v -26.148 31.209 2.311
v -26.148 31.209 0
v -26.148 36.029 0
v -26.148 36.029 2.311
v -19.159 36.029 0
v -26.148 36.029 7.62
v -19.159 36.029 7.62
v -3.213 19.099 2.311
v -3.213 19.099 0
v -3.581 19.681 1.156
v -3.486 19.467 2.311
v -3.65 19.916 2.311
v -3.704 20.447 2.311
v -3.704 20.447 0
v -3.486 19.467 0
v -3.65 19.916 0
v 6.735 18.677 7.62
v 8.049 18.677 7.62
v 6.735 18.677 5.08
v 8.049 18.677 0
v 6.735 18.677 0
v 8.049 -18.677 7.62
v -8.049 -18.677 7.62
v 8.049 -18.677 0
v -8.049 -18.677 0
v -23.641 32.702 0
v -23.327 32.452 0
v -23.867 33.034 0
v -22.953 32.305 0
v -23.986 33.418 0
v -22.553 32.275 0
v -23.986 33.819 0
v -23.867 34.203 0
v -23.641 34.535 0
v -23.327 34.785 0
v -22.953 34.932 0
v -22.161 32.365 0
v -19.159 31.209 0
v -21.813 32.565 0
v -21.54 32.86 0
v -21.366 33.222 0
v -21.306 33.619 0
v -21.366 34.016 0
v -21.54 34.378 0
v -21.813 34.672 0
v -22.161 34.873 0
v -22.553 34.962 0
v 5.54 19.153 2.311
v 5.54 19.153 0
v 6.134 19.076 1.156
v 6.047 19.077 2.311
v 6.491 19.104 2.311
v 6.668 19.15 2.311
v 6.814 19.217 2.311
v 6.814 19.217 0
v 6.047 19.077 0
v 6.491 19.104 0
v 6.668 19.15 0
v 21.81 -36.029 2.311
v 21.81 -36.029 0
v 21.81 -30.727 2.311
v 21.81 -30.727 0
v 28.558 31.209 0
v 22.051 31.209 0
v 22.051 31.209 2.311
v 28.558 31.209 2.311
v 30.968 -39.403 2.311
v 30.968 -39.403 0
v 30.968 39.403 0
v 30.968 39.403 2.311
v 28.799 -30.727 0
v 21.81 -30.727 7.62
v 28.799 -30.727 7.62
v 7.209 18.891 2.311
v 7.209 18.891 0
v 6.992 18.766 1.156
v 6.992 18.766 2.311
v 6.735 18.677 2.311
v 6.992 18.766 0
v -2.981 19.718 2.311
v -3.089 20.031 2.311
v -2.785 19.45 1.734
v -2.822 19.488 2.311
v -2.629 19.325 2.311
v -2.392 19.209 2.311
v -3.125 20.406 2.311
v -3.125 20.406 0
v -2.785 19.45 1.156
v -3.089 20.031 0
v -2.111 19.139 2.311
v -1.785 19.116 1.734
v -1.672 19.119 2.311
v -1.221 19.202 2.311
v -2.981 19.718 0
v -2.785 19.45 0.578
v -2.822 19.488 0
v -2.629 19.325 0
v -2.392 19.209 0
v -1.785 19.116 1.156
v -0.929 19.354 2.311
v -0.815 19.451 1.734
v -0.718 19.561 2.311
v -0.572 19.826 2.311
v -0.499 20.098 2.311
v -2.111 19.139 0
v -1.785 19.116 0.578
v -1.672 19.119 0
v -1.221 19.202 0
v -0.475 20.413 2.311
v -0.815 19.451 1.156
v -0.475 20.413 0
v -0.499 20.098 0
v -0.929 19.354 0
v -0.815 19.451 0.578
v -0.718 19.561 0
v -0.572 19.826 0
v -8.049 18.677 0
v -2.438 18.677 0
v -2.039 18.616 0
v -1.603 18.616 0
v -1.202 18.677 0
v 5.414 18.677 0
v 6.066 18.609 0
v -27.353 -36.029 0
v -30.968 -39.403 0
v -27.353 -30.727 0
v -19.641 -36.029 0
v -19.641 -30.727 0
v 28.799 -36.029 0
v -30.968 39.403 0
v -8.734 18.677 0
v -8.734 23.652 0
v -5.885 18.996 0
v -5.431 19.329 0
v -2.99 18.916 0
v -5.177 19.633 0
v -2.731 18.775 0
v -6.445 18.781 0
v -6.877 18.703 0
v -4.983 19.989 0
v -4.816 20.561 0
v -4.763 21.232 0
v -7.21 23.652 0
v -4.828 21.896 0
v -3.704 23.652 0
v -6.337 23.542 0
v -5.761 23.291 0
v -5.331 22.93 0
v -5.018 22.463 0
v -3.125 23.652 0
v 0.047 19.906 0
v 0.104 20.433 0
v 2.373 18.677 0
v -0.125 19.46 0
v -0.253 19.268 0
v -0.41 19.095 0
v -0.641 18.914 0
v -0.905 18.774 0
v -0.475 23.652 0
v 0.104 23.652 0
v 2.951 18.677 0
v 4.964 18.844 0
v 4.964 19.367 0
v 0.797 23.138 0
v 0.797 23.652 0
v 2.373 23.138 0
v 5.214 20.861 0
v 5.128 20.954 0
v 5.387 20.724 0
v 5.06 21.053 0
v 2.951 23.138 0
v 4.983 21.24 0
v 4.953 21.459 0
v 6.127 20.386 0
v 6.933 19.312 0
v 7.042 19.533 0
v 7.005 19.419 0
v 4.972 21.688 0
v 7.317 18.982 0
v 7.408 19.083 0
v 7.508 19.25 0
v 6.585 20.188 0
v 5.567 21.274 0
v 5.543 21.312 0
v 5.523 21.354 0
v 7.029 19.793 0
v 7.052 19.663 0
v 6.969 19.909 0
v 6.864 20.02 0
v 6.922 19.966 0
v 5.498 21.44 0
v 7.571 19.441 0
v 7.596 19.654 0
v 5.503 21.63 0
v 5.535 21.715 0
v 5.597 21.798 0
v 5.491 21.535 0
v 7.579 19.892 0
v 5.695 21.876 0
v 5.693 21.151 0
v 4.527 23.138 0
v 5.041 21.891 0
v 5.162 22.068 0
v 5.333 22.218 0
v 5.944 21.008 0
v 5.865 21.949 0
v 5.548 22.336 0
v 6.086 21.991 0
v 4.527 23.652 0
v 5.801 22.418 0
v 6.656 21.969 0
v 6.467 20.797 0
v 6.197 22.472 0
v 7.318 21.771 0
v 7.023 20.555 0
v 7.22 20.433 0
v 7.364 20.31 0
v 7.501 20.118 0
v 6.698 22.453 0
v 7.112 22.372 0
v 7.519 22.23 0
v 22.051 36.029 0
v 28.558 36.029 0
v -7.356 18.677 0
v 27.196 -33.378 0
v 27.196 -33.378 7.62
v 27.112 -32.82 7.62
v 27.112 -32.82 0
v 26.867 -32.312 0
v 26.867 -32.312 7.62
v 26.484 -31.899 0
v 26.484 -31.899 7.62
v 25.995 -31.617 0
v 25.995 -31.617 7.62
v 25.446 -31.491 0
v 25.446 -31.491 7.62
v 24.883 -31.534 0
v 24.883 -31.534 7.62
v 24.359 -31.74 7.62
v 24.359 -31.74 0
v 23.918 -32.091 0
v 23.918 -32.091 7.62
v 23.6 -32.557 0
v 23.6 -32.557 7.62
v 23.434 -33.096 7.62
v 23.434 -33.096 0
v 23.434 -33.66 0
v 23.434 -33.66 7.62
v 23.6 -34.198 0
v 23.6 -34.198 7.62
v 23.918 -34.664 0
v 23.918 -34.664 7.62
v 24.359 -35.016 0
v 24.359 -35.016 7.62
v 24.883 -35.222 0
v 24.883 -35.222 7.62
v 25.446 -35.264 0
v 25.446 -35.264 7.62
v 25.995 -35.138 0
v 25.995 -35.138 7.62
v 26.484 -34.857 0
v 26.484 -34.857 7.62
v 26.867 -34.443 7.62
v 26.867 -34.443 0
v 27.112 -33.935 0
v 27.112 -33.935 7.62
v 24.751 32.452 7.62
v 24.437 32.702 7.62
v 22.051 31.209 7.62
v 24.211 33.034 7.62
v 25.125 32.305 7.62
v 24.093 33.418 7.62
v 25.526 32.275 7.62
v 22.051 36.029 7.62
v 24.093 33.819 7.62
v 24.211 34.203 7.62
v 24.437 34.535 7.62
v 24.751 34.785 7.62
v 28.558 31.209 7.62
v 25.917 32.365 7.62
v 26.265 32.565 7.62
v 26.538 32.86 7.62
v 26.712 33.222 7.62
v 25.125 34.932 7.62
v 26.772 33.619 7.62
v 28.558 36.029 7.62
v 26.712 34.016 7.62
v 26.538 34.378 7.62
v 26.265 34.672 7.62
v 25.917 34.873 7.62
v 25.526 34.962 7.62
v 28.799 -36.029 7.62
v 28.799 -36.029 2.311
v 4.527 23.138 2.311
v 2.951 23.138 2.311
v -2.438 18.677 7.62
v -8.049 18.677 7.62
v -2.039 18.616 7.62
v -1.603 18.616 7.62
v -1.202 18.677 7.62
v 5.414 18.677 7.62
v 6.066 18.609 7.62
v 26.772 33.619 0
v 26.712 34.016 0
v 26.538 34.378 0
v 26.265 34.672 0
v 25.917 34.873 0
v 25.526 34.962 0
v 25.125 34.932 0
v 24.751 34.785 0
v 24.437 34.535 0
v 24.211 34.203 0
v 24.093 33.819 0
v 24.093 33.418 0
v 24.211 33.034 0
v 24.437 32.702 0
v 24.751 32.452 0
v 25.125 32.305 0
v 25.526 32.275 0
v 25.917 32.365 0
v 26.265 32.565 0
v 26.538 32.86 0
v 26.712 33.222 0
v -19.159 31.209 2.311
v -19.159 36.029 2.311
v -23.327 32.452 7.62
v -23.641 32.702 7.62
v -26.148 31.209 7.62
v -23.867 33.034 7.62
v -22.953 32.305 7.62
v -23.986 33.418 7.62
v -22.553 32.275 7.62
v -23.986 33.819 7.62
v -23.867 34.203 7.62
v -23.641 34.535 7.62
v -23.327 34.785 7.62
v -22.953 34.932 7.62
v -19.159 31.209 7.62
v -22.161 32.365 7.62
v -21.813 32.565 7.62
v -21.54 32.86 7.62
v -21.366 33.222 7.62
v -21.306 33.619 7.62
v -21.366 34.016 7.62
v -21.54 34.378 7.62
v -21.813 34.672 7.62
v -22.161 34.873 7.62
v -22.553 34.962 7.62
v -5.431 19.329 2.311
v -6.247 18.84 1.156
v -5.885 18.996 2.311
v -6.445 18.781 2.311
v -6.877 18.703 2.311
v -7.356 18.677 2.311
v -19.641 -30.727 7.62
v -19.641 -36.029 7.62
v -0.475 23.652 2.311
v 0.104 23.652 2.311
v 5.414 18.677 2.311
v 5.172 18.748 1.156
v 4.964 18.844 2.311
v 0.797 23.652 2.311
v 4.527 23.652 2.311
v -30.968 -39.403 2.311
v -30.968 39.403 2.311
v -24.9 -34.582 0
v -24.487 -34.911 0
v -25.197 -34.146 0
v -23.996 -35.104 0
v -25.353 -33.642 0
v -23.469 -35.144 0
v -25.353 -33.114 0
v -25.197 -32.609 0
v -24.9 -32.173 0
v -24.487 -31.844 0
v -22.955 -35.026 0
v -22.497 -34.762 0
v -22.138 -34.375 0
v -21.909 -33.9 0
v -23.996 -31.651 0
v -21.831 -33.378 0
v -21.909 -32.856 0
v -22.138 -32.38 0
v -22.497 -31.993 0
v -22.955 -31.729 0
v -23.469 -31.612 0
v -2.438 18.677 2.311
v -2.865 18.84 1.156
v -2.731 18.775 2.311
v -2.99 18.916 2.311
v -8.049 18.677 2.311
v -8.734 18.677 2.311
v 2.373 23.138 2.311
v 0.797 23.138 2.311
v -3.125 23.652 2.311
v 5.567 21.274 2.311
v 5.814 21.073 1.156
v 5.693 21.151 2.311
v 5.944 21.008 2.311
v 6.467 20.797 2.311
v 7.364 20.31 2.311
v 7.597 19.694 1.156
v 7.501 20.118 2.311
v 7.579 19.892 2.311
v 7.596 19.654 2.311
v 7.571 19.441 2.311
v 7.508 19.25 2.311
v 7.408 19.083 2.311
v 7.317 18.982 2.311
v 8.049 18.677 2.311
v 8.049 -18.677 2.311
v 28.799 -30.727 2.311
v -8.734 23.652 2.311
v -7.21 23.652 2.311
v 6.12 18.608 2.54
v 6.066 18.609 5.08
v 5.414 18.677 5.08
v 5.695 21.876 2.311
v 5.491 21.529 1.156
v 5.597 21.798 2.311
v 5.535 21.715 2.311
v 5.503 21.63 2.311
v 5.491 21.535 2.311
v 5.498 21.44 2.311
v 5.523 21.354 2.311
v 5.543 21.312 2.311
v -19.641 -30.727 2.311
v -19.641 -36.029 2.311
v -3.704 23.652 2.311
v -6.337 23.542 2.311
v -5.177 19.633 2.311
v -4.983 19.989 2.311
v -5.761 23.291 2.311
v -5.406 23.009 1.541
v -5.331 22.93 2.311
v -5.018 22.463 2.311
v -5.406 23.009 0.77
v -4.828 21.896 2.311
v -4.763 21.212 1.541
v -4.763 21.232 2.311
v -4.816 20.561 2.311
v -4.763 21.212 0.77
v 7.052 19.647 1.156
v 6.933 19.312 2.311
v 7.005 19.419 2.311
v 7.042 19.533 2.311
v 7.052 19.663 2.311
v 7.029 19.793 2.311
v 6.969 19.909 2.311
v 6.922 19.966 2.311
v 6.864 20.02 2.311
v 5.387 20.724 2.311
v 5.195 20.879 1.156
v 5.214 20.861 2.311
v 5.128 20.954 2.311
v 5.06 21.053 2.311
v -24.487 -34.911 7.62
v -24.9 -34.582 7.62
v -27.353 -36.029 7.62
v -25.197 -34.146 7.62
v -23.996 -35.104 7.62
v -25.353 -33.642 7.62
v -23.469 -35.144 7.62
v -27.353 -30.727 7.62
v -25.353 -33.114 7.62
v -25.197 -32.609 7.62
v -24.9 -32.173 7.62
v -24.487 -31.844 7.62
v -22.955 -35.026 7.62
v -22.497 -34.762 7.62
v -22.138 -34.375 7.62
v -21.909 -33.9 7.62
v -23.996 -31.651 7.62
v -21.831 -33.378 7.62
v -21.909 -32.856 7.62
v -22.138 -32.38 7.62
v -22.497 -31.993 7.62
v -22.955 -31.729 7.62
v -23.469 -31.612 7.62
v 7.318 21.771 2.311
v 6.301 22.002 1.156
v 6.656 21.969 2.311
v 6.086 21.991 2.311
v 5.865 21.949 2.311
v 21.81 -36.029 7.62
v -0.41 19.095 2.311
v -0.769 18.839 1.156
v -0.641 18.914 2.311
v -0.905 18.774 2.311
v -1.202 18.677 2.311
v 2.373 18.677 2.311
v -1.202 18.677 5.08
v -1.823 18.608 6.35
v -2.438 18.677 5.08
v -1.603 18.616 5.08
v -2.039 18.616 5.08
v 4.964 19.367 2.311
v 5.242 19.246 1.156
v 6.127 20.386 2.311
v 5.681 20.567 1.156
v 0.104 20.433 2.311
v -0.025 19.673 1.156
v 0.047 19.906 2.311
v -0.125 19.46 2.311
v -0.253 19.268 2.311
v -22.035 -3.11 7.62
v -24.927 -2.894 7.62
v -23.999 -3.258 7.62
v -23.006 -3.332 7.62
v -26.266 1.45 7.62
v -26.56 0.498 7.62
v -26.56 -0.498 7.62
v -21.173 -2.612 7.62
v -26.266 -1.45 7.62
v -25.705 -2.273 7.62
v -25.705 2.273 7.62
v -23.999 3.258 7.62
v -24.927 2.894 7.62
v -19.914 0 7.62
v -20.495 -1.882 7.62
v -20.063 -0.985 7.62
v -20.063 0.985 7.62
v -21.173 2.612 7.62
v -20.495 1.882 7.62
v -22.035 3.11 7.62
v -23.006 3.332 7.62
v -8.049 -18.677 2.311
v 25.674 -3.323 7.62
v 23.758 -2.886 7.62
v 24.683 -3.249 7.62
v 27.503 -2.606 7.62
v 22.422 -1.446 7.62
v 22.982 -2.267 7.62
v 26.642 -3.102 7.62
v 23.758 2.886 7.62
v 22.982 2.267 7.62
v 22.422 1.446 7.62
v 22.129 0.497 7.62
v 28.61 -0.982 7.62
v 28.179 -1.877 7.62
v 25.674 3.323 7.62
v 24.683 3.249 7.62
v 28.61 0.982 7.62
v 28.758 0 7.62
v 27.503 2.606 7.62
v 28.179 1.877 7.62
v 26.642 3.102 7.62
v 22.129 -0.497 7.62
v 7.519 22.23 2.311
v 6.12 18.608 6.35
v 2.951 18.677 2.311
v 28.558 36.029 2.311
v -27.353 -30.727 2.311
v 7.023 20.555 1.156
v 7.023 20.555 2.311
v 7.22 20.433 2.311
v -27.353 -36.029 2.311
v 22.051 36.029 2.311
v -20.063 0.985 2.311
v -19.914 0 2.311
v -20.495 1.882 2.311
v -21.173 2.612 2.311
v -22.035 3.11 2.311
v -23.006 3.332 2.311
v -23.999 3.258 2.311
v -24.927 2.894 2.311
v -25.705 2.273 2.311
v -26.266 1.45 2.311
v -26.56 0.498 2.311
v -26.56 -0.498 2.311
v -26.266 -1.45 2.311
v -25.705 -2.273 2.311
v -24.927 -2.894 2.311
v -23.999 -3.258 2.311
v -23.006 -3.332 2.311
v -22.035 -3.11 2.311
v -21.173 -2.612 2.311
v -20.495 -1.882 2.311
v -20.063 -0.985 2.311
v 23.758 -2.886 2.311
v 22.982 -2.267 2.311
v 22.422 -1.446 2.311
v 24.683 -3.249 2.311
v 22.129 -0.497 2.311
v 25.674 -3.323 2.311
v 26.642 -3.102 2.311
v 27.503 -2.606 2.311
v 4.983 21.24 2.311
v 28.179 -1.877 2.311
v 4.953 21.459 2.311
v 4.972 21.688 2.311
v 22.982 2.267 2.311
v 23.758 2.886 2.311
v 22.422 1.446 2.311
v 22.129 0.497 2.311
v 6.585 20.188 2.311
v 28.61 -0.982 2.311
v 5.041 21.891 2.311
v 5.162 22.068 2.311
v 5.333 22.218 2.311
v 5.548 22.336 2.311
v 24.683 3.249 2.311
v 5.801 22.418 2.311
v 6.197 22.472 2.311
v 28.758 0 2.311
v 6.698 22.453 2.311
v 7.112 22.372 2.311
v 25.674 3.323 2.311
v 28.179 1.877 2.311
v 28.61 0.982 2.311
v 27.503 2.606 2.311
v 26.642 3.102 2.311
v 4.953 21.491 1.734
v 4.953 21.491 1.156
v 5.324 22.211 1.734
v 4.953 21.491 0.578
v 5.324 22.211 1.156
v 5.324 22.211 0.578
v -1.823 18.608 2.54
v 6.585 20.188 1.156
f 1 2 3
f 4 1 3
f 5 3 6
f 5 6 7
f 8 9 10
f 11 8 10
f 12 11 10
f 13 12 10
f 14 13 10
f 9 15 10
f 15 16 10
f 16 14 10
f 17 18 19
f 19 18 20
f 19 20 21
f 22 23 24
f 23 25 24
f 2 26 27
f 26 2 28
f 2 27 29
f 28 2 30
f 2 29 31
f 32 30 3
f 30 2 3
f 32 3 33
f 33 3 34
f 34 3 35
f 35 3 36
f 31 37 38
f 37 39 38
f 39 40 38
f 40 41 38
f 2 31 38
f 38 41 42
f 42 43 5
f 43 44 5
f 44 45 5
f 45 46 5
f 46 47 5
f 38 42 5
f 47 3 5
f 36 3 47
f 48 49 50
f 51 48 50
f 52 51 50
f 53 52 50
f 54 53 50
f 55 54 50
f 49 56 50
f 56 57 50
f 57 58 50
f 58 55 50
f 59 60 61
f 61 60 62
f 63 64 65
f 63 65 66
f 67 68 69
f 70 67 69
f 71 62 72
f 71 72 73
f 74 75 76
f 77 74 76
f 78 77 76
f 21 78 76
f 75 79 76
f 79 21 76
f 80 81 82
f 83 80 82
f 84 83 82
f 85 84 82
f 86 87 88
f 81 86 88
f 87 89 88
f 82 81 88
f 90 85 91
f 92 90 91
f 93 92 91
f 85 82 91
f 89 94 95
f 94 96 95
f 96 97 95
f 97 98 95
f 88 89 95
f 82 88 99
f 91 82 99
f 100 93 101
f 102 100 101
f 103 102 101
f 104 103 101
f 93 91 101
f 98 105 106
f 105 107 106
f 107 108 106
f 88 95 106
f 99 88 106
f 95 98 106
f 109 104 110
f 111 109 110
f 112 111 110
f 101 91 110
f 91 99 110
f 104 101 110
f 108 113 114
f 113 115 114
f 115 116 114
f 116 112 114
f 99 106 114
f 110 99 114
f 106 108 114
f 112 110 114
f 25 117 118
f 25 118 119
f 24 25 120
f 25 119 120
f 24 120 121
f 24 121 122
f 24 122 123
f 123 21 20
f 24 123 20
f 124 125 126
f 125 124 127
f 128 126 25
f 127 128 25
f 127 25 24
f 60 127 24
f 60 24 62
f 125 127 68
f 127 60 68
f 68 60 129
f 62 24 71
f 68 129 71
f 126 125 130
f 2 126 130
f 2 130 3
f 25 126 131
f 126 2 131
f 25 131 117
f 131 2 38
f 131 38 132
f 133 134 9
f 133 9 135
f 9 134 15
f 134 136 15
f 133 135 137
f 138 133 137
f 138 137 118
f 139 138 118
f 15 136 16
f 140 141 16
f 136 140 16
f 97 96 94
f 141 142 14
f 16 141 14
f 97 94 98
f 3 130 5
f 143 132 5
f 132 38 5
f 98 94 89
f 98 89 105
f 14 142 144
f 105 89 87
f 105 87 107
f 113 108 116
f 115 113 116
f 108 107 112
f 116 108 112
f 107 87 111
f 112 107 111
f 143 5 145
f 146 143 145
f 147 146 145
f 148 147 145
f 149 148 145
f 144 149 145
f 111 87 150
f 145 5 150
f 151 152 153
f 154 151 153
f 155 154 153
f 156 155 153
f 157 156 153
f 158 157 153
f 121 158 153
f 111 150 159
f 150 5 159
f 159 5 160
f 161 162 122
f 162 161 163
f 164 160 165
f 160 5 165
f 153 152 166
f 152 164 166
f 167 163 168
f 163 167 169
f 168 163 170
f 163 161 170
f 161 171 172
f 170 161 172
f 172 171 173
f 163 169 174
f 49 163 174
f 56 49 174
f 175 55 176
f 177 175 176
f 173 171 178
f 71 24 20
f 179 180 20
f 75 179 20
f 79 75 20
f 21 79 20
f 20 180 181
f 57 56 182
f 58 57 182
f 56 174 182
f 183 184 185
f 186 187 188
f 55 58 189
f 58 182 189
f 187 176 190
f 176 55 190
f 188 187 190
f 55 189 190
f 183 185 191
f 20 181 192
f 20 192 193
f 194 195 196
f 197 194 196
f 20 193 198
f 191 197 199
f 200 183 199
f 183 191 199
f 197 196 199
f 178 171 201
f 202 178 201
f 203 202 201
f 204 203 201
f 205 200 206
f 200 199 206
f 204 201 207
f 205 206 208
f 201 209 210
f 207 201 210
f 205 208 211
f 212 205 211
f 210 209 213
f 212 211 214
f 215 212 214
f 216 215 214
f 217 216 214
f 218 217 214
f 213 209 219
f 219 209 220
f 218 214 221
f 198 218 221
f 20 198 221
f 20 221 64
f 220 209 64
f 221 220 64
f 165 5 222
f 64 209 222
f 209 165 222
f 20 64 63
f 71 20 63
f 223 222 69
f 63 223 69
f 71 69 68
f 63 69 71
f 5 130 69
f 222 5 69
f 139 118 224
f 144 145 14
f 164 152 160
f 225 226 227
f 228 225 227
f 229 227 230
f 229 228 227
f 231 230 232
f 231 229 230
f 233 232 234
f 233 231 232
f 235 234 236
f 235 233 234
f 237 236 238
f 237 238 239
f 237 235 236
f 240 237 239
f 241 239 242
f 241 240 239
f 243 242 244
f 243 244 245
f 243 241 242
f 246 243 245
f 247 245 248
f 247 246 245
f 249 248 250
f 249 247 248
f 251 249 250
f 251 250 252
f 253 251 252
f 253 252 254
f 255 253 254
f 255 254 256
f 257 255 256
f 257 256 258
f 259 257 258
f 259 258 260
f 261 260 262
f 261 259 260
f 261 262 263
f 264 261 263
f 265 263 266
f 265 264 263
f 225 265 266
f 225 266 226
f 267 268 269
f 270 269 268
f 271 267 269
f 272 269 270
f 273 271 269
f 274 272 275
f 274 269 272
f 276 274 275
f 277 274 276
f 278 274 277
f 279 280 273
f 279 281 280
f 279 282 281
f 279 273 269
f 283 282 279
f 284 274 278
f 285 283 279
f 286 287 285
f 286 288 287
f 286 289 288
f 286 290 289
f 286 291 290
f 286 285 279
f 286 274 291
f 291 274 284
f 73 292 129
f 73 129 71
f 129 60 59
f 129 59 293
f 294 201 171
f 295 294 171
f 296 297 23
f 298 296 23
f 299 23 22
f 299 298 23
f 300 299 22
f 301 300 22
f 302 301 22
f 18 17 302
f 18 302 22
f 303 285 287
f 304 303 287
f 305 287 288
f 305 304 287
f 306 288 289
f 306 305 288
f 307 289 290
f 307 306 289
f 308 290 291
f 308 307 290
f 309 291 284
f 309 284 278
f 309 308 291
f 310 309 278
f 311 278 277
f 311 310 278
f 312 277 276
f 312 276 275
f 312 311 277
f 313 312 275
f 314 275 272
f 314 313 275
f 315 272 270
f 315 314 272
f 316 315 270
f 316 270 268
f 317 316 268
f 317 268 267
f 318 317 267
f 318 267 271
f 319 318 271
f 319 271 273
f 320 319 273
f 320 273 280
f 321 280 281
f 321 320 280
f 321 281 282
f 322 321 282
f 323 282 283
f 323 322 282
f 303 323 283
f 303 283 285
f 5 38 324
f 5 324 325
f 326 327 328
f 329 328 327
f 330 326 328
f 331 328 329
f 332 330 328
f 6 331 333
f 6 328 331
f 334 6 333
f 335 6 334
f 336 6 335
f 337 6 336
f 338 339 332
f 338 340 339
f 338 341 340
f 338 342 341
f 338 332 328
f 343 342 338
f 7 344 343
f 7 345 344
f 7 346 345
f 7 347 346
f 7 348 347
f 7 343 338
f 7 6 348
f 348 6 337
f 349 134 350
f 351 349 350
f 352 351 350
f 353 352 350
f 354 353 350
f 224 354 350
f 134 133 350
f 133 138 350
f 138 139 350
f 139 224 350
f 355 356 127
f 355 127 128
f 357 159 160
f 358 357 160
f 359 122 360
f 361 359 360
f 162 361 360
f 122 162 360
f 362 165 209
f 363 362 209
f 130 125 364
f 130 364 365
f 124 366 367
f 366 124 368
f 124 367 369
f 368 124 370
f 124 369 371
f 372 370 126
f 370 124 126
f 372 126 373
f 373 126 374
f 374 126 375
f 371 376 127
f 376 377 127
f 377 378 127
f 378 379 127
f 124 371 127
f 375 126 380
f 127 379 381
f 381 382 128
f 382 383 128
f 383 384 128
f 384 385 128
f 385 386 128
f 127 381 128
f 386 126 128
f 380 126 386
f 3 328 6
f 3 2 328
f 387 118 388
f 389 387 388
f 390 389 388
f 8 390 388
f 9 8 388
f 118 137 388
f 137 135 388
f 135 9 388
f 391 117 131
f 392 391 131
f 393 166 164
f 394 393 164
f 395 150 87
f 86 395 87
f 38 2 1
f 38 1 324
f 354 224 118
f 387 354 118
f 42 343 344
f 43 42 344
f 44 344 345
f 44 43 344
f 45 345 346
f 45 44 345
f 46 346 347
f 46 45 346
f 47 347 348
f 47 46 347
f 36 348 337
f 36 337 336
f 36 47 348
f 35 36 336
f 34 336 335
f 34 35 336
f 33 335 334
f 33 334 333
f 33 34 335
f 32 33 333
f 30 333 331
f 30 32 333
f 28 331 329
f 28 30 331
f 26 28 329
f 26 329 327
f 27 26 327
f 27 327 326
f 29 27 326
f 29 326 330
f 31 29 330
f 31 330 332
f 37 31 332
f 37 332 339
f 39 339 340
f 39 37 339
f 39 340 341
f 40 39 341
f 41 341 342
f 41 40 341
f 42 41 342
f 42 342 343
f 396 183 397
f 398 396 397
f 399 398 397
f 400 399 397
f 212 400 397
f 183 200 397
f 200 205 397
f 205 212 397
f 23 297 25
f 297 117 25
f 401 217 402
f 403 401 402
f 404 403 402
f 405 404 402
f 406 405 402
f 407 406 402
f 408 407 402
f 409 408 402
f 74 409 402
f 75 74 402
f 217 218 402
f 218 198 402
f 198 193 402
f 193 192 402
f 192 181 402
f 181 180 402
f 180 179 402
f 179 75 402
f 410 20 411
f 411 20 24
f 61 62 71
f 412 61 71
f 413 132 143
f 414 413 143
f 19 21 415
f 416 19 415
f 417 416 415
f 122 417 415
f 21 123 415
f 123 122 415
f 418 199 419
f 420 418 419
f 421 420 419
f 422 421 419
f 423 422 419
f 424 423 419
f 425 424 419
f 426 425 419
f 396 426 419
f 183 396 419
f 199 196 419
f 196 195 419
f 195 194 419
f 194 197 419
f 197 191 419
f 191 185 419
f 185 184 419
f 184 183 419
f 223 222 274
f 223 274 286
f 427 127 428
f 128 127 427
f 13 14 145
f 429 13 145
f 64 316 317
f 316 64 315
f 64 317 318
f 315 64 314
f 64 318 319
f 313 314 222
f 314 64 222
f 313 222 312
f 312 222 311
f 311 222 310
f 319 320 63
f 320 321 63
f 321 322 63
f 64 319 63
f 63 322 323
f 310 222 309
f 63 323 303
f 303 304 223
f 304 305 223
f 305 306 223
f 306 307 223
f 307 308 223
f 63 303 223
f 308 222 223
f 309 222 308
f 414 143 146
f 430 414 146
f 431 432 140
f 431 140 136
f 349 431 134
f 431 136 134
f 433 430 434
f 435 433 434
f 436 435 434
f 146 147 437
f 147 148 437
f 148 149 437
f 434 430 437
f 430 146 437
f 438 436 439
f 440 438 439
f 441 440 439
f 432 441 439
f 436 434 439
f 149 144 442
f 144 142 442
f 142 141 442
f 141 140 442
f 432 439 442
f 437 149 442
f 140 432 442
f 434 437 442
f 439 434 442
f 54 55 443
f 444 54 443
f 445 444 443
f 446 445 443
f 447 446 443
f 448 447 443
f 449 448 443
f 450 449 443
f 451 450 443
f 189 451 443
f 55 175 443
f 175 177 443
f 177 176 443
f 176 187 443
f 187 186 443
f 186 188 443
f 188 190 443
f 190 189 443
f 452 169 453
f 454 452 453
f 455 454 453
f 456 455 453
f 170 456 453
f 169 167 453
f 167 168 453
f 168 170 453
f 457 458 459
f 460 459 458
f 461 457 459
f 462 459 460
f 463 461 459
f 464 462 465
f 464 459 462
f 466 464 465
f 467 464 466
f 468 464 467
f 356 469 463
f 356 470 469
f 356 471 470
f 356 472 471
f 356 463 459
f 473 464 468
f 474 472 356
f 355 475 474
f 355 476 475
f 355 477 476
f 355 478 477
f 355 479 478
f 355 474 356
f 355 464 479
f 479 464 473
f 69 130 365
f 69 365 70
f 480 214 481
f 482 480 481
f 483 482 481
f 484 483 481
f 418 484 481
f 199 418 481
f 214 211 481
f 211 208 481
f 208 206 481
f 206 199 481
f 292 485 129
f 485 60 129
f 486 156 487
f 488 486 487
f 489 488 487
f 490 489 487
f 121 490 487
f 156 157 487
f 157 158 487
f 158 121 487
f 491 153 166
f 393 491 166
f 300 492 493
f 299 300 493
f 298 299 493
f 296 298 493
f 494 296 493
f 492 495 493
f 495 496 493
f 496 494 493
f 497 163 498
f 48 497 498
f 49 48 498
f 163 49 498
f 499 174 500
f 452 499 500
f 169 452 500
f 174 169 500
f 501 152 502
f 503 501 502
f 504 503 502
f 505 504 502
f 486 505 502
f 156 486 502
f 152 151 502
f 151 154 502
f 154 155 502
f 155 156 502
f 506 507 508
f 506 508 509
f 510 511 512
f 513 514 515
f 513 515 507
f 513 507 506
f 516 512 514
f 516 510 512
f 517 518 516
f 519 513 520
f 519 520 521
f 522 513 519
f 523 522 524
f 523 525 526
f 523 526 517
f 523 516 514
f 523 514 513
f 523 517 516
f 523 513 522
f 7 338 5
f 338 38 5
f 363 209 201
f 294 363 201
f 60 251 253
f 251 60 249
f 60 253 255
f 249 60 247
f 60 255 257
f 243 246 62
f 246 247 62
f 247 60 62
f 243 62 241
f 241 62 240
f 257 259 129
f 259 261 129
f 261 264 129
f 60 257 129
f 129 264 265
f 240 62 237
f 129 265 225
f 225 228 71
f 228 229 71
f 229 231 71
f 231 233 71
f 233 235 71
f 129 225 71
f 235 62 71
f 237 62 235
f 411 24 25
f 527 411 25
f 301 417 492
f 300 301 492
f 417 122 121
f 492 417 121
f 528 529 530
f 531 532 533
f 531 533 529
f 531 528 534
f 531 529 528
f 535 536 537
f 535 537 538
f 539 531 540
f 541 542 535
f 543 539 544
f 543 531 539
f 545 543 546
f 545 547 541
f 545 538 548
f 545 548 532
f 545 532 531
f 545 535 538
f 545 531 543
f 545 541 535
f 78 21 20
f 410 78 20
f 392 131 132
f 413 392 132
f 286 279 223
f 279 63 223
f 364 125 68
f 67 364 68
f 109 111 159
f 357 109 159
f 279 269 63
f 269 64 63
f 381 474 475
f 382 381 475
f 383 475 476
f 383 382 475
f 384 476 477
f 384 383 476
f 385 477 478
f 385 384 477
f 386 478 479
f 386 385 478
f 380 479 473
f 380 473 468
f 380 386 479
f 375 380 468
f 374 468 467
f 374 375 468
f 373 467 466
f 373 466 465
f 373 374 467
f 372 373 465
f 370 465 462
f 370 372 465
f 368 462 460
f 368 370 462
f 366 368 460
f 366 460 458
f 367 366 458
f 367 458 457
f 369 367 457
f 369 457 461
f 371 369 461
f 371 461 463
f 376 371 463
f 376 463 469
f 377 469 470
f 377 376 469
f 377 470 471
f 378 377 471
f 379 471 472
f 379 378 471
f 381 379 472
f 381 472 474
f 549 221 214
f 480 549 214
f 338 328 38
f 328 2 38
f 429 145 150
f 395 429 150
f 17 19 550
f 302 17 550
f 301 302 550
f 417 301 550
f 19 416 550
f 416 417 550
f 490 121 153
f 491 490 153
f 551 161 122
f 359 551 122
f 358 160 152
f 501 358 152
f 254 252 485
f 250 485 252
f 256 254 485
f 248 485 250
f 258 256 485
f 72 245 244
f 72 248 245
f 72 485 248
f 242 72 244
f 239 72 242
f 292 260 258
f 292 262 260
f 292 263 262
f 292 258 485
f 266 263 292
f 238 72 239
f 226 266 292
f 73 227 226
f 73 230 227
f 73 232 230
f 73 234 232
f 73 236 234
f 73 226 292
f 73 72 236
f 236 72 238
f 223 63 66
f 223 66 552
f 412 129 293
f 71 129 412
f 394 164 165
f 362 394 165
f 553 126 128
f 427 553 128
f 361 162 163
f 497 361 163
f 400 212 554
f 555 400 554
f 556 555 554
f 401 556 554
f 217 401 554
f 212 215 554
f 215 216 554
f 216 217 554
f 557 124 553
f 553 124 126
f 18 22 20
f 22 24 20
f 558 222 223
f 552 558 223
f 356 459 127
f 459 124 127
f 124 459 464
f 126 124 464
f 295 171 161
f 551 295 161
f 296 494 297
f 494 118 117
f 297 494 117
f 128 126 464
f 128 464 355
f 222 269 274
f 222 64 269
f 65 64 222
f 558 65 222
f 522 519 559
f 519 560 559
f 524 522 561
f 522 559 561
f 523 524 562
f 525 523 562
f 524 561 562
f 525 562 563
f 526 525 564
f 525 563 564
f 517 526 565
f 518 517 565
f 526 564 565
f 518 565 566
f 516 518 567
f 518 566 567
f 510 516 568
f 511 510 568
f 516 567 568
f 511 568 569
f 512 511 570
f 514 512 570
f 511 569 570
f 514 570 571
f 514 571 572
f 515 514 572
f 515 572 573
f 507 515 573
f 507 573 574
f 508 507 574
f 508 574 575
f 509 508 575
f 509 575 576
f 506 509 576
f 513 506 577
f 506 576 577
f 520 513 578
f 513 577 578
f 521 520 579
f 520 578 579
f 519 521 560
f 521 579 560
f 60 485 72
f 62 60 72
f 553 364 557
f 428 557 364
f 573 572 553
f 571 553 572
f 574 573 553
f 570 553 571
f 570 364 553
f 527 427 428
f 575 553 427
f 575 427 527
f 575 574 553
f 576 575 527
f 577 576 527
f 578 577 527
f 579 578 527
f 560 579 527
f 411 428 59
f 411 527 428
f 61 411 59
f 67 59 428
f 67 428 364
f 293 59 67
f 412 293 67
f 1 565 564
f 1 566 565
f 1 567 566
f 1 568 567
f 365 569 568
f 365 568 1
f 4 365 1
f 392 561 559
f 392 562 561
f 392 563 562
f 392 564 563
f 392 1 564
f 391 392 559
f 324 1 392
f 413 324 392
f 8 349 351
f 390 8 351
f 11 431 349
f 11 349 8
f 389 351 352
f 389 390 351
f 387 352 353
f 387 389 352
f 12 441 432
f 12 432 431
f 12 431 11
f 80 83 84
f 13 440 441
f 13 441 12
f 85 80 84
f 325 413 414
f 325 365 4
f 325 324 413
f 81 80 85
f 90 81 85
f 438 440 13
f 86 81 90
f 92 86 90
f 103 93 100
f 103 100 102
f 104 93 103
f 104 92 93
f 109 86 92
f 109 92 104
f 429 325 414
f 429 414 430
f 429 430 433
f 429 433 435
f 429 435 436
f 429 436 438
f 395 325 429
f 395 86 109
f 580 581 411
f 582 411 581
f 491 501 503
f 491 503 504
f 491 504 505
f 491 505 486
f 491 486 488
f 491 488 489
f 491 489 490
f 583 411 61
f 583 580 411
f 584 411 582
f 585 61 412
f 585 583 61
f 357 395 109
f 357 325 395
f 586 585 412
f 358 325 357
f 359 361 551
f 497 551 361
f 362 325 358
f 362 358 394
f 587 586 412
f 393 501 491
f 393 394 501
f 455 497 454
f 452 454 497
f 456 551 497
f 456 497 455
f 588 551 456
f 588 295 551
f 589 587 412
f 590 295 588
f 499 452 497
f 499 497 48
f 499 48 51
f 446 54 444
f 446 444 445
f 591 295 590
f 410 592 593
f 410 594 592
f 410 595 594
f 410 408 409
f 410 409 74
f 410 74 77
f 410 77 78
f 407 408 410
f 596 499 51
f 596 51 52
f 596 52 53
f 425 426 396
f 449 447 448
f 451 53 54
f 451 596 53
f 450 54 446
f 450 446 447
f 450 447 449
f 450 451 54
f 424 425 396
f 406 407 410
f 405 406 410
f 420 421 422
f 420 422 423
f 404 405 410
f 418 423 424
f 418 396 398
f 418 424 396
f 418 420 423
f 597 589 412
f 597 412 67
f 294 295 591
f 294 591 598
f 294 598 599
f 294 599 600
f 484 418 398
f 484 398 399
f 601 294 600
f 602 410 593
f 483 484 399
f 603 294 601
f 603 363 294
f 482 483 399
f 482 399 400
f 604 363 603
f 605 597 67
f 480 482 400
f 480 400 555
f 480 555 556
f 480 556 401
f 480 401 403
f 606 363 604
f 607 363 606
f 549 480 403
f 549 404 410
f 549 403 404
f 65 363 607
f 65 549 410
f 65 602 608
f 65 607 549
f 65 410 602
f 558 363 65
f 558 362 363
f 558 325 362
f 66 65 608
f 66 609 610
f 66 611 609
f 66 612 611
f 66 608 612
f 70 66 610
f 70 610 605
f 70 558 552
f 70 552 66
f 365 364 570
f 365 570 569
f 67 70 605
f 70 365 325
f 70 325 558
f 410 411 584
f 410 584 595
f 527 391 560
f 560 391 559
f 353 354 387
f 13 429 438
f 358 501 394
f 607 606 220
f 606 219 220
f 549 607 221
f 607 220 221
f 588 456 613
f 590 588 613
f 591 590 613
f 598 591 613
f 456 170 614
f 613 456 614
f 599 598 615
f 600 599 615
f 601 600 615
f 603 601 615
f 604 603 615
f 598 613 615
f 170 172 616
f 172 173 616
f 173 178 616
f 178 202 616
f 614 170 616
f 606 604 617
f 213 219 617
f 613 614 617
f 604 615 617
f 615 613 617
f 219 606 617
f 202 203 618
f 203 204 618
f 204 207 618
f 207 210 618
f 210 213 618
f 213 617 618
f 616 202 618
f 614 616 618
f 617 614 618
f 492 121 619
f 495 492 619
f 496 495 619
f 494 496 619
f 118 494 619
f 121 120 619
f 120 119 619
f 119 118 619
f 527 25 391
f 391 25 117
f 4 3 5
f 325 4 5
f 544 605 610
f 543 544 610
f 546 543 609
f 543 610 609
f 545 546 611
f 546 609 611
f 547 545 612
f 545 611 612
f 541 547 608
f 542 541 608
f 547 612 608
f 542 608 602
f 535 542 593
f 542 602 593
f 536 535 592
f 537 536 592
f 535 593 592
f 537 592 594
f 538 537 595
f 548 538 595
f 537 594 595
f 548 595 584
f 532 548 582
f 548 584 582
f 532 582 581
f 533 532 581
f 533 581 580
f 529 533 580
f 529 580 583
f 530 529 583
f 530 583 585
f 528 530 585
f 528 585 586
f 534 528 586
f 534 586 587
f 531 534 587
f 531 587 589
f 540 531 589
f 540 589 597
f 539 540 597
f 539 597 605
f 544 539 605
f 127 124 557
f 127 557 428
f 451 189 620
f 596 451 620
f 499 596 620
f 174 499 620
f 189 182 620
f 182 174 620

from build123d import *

# Parameters (mm, degrees)
F0_W     = 7.7118072659
F0_H     = 5.301868543
F0_R     = 1.7710457529
F1_DEPTH = 5.08
F2_DEPTH = 5.08
F0_W_2   = 6.9888234138
F0_H_2   = 4.819881171
F0_R_2   = 1.3471992838
F0_W_3   = 6.5068379045
F0_R_3   = 1.3471999502
F0_W_4   = 6.9888252765
F0_R_4   = 1.8915130698
F0_W_5   = 61.9354508817
F0_H_3   = 78.8050293922
F0_R_5   = 3.3414839528
F0_R_6   = 3.3327824733
F3_DEPTH = 2.3114
F4_DEPTH = 5.08
F5_DEPTH = 5.08
F6_DEPTH = 2.54
F7_DEPTH = 2.54


with BuildPart() as f1:
    # F0 (on Top) → F1 (new body)
    with BuildSketch(Plane.XY):
        with Locations((-23.4969137236, -33.3776669577)):
            Rectangle(F0_W, F0_H)
        with Locations((-23.6016474664, -33.3776669577)):
            Circle(F0_R, mode=Mode.SUBTRACT)
    extrude(amount=F1_DEPTH)

    # F6 (add): a face of the model
    f6_faces = [f1.faces().sort_by_distance(p)[0] for p in [
        (-27.2592322182, -33.3776669577, 5.08),
    ]]
    extrude(f6_faces, amount=F6_DEPTH)


with BuildPart() as f2:
    # F0 (on Top) → F2 (new body)
    with BuildSketch(Plane.XY):
        with BuildLine():
            Line((5.4143961645, 18.6770316213), (2.9512789585, 18.6770316213))
            Line((2.9512789585, 18.6770316213), (2.3730507167, 18.6770316213))
            Line((2.3730507167, 18.6770316213), (-1.2022836336, 18.6770316213))
            add(Edge.make_bspline(
                [(-1.2022836336, 18.6770316213), (-1.4853750183, 18.6084282706), (-1.8226430983, 18.6084282706)],
                knots=[0.6245807712, 0.6245807712, 0.6245807712, 1, 1, 1], degree=2))
            add(Edge.make_bspline(
                [(-1.8226430983, 18.6084282706), (-2.1585984814, 18.6084282706), (-2.4376762806, 18.6770316213)],
                knots=[0, 0, 0, 0.3739580419, 0.3739580419, 0.3739580419], degree=2))
            Line((-2.4376762806, 18.6770316213), (-7.3555577815, 18.6770316213))
            Line((-7.3555577815, 18.6770316213), (-8.0486168117, 18.6770316213))
            Line((-8.0486168117, 18.6770316213), (-8.0486168117, -18.6770316213))
            Line((-8.0486168117, -18.6770316213), (8.0486168117, -18.6770316213))
            Line((8.0486168117, -18.6770316213), (8.0486168117, 18.6770316213))
            Line((8.0486168117, 18.6770316213), (6.7350328843, 18.6770316213))
            add(Edge.make_bspline(
                [(6.7350328843, 18.6770316213), (6.465635552, 18.6084282706), (6.1201003968, 18.6084282706)],
                knots=[0.5072784088, 0.5072784088, 0.5072784088, 1, 1, 1], degree=2))
            add(Edge.make_bspline(
                [(6.1201003968, 18.6084282706), (5.7196070649, 18.6084282706), (5.4143961645, 18.6770316213)],
                knots=[0, 0, 0, 0.5400617249, 0.5400617249, 0.5400617249], degree=2))
        make_face()
    extrude(amount=F2_DEPTH)

    # F7 (add): a face of the model
    f7_faces = [f2.faces().sort_by_distance(p)[0] for p in [
        (-0.0004562, -0.0037266133, 5.08),
    ]]
    extrude(f7_faces, amount=F7_DEPTH)


with BuildPart() as f2b:
    # F0 (on Top) → F2, piece 2 (new body)
    with BuildSketch(Plane.XY):
        with Locations((-22.6534344256, 33.6186606437)):
            Rectangle(F0_W_2, F0_H_2)
        with Locations((-22.6534344256, 33.6186606437)):
            Circle(F0_R_2, mode=Mode.SUBTRACT)
    extrude(amount=F2_DEPTH)

    # F6#3 (add): a face of the model
    f6_3_faces = [f2b.faces().sort_by_distance(p)[0] for p in [
        (-22.6534344256, 35.9437042874, 5.08),
    ]]
    extrude(f6_3_faces, amount=F6_DEPTH)


with BuildPart() as f2c:
    # F0 (on Top) → F2, piece 3 (new body)
    with BuildSketch(Plane.XY):
        with Locations((25.3043696284, 33.6186606437)):
            Rectangle(F0_W_3, F0_H_2)
        with Locations((25.4248641431, 33.6186606437)):
            Circle(F0_R_3, mode=Mode.SUBTRACT)
    extrude(amount=F2_DEPTH)

    # F6#4 (add): a face of the model
    f6_4_faces = [f2c.faces().sort_by_distance(p)[0] for p in [
        (22.1319261009, 33.6186606437, 5.08),
    ]]
    extrude(f6_4_faces, amount=F6_DEPTH)


with BuildPart() as f2d:
    # F0 (on Top) → F2, piece 4 (new body)
    with BuildSketch(Plane.XY):
        with Locations((25.3043705598, -33.3776669577)):
            Rectangle(F0_W_4, F0_H)
        with Locations((25.3043705598, -33.3776669577)):
            Circle(F0_R_4, mode=Mode.SUBTRACT)
    extrude(amount=F2_DEPTH)

    # F6#2 (add): a face of the model
    f6_2_faces = [f2d.faces().sort_by_distance(p)[0] for p in [
        (21.8976810592, -33.3776669577, 5.08),
    ]]
    extrude(f6_2_faces, amount=F6_DEPTH)


with BuildPart() as f3:
    # F0 (on Top) → F3 (new body)
    with BuildSketch(Plane.XY):
        Rectangle(F0_W_5, F0_H_3)
        with Locations((-23.4969137236, -33.3776669577)):
            Rectangle(F0_W, F0_H, mode=Mode.SUBTRACT)
        with Locations((25.3043705598, -33.3776669577)):
            Rectangle(F0_W_4, F0_H, mode=Mode.SUBTRACT)
        with Locations((-23.255918175, 0)):
            Circle(F0_R_5, mode=Mode.SUBTRACT)
        with BuildLine():
            Line((2.9512789585, 23.1384273027), (2.9512789585, 18.6770316213))
            Line((2.9512789585, 18.6770316213), (5.4143961645, 18.6770316213))
            add(Edge.make_bspline(
                [(5.4143961645, 18.6770316213), (5.1544662924, 18.7354569926), (4.9636439132, 18.8436397588)],
                knots=[0.5400617249, 0.5400617249, 0.5400617249, 1, 1, 1], degree=2))
            Line((4.9636439132, 18.8436397588), (4.9636439132, 19.3674208969))
            add(Edge.make_bspline(
                [(4.9636439132, 19.3674208969), (5.2326126057, 19.2313031375), (5.5402387419, 19.1534437792)],
                knots=[0, 0, 0, 1, 1, 1], degree=2))
            add(Edge.make_bspline(
                [(5.5402387419, 19.1534437792), (5.8478648781, 19.0755844208), (6.1342566438, 19.0755844208)],
                knots=[0, 0, 0, 1, 1, 1], degree=2))
            add(Edge.make_bspline(
                [(6.1342566438, 19.0755844208), (6.5763671263, 19.0755844208), (6.8143009696, 19.2166024195)],
                knots=[0, 0, 0, 1, 1, 1], degree=2))
            add(Edge.make_bspline(
                [(6.8143009696, 19.2166024195), (7.052234813, 19.3576204182), (7.052234813, 19.6472790102)],
                knots=[0, 0, 0, 1, 1, 1], degree=2))
            add(Edge.make_bspline(
                [(7.052234813, 19.6472790102), (7.052234813, 19.8650674252), (6.8638478341, 20.0196971998)],
                knots=[0, 0, 0, 1, 1, 1], degree=2))
            add(Edge.make_bspline(
                [(6.8638478341, 20.0196971998), (6.6754608551, 20.1743269745), (6.1266340493, 20.385581737)],
                knots=[0, 0, 0, 1, 1, 1], degree=2))
            add(Edge.make_bspline(
                [(6.1266340493, 20.385581737), (5.6061197374, 20.5794134264), (5.3866979093, 20.7242427224)],
                knots=[0, 0, 0, 1, 1, 1], degree=2))
            add(Edge.make_bspline(
                [(5.3866979093, 20.7242427224), (5.1672760812, 20.8690720183), (5.0600152868, 21.052558758)],
                knots=[0, 0, 0, 1, 1, 1], degree=2))
            add(Edge.make_bspline(
                [(5.0600152868, 21.052558758), (4.9527544924, 21.2360454976), (4.9527544924, 21.4908579432)],
                knots=[0, 0, 0, 1, 1, 1], degree=2))
            add(Edge.make_bspline(
                [(4.9527544924, 21.4908579432), (4.9527544924, 21.9471246726), (5.32408374, 22.2111931258)],
                knots=[0, 0, 0, 1, 1, 1], degree=2))
            add(Edge.make_bspline(
                [(5.32408374, 22.2111931258), (5.6954129876, 22.475261579), (6.341155638, 22.475261579)],
                knots=[0, 0, 0, 1, 1, 1], degree=2))
            add(Edge.make_bspline(
                [(6.341155638, 22.475261579), (6.9433406055, 22.475261579), (7.5193909632, 22.2302496121)],
                knots=[0, 0, 0, 1, 1, 1], degree=2))
            Line((7.5193909632, 22.2302496121), (7.3179366793, 21.7707160565))
            add(Edge.make_bspline(
                [(7.3179366793, 21.7707160565), (6.7571315107, 22.0015717764), (6.3008647813, 22.0015717764)],
                knots=[0, 0, 0, 1, 1, 1], degree=2))
            add(Edge.make_bspline(
                [(6.3008647813, 22.0015717764), (5.8990451556, 22.0015717764), (5.6948685165, 21.8757989667)],
                knots=[0, 0, 0, 1, 1, 1], degree=2))
            add(Edge.make_bspline(
                [(5.6948685165, 21.8757989667), (5.4906918775, 21.750026157), (5.4906918775, 21.5289709158)],
                knots=[0, 0, 0, 1, 1, 1], degree=2))
            add(Edge.make_bspline(
                [(5.4906918775, 21.5289709158), (5.4906918775, 21.3786969094), (5.5674622938, 21.2736139992)],
                knots=[0, 0, 0, 1, 1, 1], degree=2))
            add(Edge.make_bspline(
                [(5.5674622938, 21.2736139992), (5.64423271, 21.168531089), (5.8141076737, 21.0732486574)],
                knots=[0, 0, 0, 1, 1, 1], degree=2))
            add(Edge.make_bspline(
                [(5.8141076737, 21.0732486574), (5.9839826374, 20.9779662258), (6.4674729188, 20.7972018414)],
                knots=[0, 0, 0, 1, 1, 1], degree=2))
            add(Edge.make_bspline(
                [(6.4674729188, 20.7972018414), (7.1306386424, 20.5554567007), (7.3636722465, 20.3104447339)],
                knots=[0, 0, 0, 1, 1, 1], degree=2))
            add(Edge.make_bspline(
                [(7.3636722465, 20.3104447339), (7.5967058505, 20.065432767), (7.5967058505, 19.6941035194)],
                knots=[0, 0, 0, 1, 1, 1], degree=2))
            add(Edge.make_bspline(
                [(7.5967058505, 19.6941035194), (7.5967058505, 19.1735892075), (7.2090424718, 18.8910087391)],
                knots=[0, 0, 0, 1, 1, 1], degree=2))
            add(Edge.make_bspline(
                [(7.2090424718, 18.8910087391), (7.01238921, 18.7476617687), (6.7350328843, 18.6770316213)],
                knots=[0, 0, 0, 0.5072784088, 0.5072784088, 0.5072784088], degree=2))
            Line((6.7350328843, 18.6770316213), (8.0486168117, 18.6770316213))
            Line((8.0486168117, 18.6770316213), (8.0486168117, -18.6770316213))
            Line((8.0486168117, -18.6770316213), (-8.0486168117, -18.6770316213))
            Line((-8.0486168117, -18.6770316213), (-8.0486168117, 18.6770316213))
            Line((-8.0486168117, 18.6770316213), (-8.7341584484, 18.6770316213))
            Line((-8.7341584484, 18.6770316213), (-8.7341584484, 23.6524079621))
            Line((-8.7341584484, 23.6524079621), (-7.2096395434, 23.6524079621))
            add(Edge.make_bspline(
                [(-7.2096395434, 23.6524079621), (-6.0488272915, 23.6524079621), (-5.4058069962, 23.0093876668)],
                knots=[0, 0, 0, 1, 1, 1], degree=2))
            add(Edge.make_bspline(
                [(-5.4058069962, 23.0093876668), (-4.7627867009, 22.3663673715), (-4.7627867009, 21.212088772)],
                knots=[0, 0, 0, 1, 1, 1], degree=2))
            add(Edge.make_bspline(
                [(-4.7627867009, 21.212088772), (-4.7627867009, 19.9804952851), (-5.4313971349, 19.3287634532)],
                knots=[0, 0, 0, 1, 1, 1], degree=2))
            add(Edge.make_bspline(
                [(-5.4313971349, 19.3287634532), (-6.100007569, 18.6770316213), (-7.3555577815, 18.6770316213)],
                knots=[0, 0, 0, 1, 1, 1], degree=2))
            Line((-7.3555577815, 18.6770316213), (-2.4376762806, 18.6770316213))
            add(Edge.make_bspline(
                [(-2.4376762806, 18.6770316213), (-2.9048795289, 18.7918802707), (-3.2126776571, 19.0989966754)],
                knots=[0.3739580419, 0.3739580419, 0.3739580419, 1, 1, 1], degree=2))
            add(Edge.make_bspline(
                [(-3.2126776571, 19.0989966754), (-3.7043350039, 19.5895650802), (-3.7043350039, 20.4465624932)],
                knots=[0, 0, 0, 1, 1, 1], degree=2))
            Line((-3.7043350039, 20.4465624932), (-3.7043350039, 23.6524079621))
            Line((-3.7043350039, 23.6524079621), (-3.12501782, 23.6524079621))
            Line((-3.12501782, 23.6524079621), (-3.12501782, 20.4062716365))
            add(Edge.make_bspline(
                [(-3.12501782, 20.4062716365), (-3.12501782, 19.7833967696), (-2.7847234216, 19.4496360236)],
                knots=[0, 0, 0, 1, 1, 1], degree=2))
            add(Edge.make_bspline(
                [(-2.7847234216, 19.4496360236), (-2.4444290232, 19.1158752776), (-1.7845301257, 19.1158752776)],
                knots=[0, 0, 0, 1, 1, 1], degree=2))
            add(Edge.make_bspline(
                [(-1.7845301257, 19.1158752776), (-1.1551216063, 19.1158752776), (-0.8148272079, 19.4512694367)],
                knots=[0, 0, 0, 1, 1, 1], degree=2))
            add(Edge.make_bspline(
                [(-0.8148272079, 19.4512694367), (-0.4745328095, 19.7866635958), (-0.4745328095, 20.4128052889)],
                knots=[0, 0, 0, 1, 1, 1], degree=2))
            Line((-0.4745328095, 20.4128052889), (-0.4745328095, 23.6524079621))
            Line((-0.4745328095, 23.6524079621), (0.1036954324, 23.6524079621))
            Line((0.1036954324, 23.6524079621), (0.1036954324, 20.4334951883))
            add(Edge.make_bspline(
                [(0.1036954324, 20.4334951883), (0.1036954324, 19.5819424857), (-0.410285227, 19.0951853781)],
                knots=[0, 0, 0, 1, 1, 1], degree=2))
            add(Edge.make_bspline(
                [(-0.410285227, 19.0951853781), (-0.7313076637, 18.7911662485), (-1.2022836336, 18.6770316213)],
                knots=[0, 0, 0, 0.6245807712, 0.6245807712, 0.6245807712], degree=2))
            Line((-1.2022836336, 18.6770316213), (2.3730507167, 18.6770316213))
            Line((2.3730507167, 18.6770316213), (2.3730507167, 23.1384273027))
            Line((2.3730507167, 23.1384273027), (0.7973515342, 23.1384273027))
            Line((0.7973515342, 23.1384273027), (0.7973515342, 23.6524079621))
            Line((0.7973515342, 23.6524079621), (4.5269781411, 23.6524079621))
            Line((4.5269781411, 23.6524079621), (4.5269781411, 23.1384273027))
            Line((4.5269781411, 23.1384273027), (2.9512789585, 23.1384273027))
        make_face(mode=Mode.SUBTRACT)
        with Locations((-22.6534344256, 33.6186606437)):
            Rectangle(F0_W_2, F0_H_2, mode=Mode.SUBTRACT)
        with Locations((25.4248641431, 0)):
            Circle(F0_R_6, mode=Mode.SUBTRACT)
        with Locations((25.3043696284, 33.6186606437)):
            Rectangle(F0_W_3, F0_H_2, mode=Mode.SUBTRACT)
    extrude(amount=F3_DEPTH)

    # F0 (on Top) → F4 (join)
    with BuildSketch(Plane.XY):
        with Locations((25.4248641431, 0)):
            Circle(F0_R_6)
    extrude(amount=F4_DEPTH)

    # F0 (on Top) → F5 (join)
    with BuildSketch(Plane.XY):
        with Locations((-23.255918175, 0)):
            Circle(F0_R_5)
    extrude(amount=F5_DEPTH)

    # F6#5 (add): faces of the model
    f6_5_faces = [f3.faces().sort_by_distance(p)[0] for p in [
        (-23.255918175, 0, 5.08),
        (25.4248641431, 0, 5.08),
    ]]
    extrude(f6_5_faces, amount=F6_DEPTH)


solid = Compound([f1.part, f2.part, f2b.part, f2c.part, f2d.part, f3.part])
